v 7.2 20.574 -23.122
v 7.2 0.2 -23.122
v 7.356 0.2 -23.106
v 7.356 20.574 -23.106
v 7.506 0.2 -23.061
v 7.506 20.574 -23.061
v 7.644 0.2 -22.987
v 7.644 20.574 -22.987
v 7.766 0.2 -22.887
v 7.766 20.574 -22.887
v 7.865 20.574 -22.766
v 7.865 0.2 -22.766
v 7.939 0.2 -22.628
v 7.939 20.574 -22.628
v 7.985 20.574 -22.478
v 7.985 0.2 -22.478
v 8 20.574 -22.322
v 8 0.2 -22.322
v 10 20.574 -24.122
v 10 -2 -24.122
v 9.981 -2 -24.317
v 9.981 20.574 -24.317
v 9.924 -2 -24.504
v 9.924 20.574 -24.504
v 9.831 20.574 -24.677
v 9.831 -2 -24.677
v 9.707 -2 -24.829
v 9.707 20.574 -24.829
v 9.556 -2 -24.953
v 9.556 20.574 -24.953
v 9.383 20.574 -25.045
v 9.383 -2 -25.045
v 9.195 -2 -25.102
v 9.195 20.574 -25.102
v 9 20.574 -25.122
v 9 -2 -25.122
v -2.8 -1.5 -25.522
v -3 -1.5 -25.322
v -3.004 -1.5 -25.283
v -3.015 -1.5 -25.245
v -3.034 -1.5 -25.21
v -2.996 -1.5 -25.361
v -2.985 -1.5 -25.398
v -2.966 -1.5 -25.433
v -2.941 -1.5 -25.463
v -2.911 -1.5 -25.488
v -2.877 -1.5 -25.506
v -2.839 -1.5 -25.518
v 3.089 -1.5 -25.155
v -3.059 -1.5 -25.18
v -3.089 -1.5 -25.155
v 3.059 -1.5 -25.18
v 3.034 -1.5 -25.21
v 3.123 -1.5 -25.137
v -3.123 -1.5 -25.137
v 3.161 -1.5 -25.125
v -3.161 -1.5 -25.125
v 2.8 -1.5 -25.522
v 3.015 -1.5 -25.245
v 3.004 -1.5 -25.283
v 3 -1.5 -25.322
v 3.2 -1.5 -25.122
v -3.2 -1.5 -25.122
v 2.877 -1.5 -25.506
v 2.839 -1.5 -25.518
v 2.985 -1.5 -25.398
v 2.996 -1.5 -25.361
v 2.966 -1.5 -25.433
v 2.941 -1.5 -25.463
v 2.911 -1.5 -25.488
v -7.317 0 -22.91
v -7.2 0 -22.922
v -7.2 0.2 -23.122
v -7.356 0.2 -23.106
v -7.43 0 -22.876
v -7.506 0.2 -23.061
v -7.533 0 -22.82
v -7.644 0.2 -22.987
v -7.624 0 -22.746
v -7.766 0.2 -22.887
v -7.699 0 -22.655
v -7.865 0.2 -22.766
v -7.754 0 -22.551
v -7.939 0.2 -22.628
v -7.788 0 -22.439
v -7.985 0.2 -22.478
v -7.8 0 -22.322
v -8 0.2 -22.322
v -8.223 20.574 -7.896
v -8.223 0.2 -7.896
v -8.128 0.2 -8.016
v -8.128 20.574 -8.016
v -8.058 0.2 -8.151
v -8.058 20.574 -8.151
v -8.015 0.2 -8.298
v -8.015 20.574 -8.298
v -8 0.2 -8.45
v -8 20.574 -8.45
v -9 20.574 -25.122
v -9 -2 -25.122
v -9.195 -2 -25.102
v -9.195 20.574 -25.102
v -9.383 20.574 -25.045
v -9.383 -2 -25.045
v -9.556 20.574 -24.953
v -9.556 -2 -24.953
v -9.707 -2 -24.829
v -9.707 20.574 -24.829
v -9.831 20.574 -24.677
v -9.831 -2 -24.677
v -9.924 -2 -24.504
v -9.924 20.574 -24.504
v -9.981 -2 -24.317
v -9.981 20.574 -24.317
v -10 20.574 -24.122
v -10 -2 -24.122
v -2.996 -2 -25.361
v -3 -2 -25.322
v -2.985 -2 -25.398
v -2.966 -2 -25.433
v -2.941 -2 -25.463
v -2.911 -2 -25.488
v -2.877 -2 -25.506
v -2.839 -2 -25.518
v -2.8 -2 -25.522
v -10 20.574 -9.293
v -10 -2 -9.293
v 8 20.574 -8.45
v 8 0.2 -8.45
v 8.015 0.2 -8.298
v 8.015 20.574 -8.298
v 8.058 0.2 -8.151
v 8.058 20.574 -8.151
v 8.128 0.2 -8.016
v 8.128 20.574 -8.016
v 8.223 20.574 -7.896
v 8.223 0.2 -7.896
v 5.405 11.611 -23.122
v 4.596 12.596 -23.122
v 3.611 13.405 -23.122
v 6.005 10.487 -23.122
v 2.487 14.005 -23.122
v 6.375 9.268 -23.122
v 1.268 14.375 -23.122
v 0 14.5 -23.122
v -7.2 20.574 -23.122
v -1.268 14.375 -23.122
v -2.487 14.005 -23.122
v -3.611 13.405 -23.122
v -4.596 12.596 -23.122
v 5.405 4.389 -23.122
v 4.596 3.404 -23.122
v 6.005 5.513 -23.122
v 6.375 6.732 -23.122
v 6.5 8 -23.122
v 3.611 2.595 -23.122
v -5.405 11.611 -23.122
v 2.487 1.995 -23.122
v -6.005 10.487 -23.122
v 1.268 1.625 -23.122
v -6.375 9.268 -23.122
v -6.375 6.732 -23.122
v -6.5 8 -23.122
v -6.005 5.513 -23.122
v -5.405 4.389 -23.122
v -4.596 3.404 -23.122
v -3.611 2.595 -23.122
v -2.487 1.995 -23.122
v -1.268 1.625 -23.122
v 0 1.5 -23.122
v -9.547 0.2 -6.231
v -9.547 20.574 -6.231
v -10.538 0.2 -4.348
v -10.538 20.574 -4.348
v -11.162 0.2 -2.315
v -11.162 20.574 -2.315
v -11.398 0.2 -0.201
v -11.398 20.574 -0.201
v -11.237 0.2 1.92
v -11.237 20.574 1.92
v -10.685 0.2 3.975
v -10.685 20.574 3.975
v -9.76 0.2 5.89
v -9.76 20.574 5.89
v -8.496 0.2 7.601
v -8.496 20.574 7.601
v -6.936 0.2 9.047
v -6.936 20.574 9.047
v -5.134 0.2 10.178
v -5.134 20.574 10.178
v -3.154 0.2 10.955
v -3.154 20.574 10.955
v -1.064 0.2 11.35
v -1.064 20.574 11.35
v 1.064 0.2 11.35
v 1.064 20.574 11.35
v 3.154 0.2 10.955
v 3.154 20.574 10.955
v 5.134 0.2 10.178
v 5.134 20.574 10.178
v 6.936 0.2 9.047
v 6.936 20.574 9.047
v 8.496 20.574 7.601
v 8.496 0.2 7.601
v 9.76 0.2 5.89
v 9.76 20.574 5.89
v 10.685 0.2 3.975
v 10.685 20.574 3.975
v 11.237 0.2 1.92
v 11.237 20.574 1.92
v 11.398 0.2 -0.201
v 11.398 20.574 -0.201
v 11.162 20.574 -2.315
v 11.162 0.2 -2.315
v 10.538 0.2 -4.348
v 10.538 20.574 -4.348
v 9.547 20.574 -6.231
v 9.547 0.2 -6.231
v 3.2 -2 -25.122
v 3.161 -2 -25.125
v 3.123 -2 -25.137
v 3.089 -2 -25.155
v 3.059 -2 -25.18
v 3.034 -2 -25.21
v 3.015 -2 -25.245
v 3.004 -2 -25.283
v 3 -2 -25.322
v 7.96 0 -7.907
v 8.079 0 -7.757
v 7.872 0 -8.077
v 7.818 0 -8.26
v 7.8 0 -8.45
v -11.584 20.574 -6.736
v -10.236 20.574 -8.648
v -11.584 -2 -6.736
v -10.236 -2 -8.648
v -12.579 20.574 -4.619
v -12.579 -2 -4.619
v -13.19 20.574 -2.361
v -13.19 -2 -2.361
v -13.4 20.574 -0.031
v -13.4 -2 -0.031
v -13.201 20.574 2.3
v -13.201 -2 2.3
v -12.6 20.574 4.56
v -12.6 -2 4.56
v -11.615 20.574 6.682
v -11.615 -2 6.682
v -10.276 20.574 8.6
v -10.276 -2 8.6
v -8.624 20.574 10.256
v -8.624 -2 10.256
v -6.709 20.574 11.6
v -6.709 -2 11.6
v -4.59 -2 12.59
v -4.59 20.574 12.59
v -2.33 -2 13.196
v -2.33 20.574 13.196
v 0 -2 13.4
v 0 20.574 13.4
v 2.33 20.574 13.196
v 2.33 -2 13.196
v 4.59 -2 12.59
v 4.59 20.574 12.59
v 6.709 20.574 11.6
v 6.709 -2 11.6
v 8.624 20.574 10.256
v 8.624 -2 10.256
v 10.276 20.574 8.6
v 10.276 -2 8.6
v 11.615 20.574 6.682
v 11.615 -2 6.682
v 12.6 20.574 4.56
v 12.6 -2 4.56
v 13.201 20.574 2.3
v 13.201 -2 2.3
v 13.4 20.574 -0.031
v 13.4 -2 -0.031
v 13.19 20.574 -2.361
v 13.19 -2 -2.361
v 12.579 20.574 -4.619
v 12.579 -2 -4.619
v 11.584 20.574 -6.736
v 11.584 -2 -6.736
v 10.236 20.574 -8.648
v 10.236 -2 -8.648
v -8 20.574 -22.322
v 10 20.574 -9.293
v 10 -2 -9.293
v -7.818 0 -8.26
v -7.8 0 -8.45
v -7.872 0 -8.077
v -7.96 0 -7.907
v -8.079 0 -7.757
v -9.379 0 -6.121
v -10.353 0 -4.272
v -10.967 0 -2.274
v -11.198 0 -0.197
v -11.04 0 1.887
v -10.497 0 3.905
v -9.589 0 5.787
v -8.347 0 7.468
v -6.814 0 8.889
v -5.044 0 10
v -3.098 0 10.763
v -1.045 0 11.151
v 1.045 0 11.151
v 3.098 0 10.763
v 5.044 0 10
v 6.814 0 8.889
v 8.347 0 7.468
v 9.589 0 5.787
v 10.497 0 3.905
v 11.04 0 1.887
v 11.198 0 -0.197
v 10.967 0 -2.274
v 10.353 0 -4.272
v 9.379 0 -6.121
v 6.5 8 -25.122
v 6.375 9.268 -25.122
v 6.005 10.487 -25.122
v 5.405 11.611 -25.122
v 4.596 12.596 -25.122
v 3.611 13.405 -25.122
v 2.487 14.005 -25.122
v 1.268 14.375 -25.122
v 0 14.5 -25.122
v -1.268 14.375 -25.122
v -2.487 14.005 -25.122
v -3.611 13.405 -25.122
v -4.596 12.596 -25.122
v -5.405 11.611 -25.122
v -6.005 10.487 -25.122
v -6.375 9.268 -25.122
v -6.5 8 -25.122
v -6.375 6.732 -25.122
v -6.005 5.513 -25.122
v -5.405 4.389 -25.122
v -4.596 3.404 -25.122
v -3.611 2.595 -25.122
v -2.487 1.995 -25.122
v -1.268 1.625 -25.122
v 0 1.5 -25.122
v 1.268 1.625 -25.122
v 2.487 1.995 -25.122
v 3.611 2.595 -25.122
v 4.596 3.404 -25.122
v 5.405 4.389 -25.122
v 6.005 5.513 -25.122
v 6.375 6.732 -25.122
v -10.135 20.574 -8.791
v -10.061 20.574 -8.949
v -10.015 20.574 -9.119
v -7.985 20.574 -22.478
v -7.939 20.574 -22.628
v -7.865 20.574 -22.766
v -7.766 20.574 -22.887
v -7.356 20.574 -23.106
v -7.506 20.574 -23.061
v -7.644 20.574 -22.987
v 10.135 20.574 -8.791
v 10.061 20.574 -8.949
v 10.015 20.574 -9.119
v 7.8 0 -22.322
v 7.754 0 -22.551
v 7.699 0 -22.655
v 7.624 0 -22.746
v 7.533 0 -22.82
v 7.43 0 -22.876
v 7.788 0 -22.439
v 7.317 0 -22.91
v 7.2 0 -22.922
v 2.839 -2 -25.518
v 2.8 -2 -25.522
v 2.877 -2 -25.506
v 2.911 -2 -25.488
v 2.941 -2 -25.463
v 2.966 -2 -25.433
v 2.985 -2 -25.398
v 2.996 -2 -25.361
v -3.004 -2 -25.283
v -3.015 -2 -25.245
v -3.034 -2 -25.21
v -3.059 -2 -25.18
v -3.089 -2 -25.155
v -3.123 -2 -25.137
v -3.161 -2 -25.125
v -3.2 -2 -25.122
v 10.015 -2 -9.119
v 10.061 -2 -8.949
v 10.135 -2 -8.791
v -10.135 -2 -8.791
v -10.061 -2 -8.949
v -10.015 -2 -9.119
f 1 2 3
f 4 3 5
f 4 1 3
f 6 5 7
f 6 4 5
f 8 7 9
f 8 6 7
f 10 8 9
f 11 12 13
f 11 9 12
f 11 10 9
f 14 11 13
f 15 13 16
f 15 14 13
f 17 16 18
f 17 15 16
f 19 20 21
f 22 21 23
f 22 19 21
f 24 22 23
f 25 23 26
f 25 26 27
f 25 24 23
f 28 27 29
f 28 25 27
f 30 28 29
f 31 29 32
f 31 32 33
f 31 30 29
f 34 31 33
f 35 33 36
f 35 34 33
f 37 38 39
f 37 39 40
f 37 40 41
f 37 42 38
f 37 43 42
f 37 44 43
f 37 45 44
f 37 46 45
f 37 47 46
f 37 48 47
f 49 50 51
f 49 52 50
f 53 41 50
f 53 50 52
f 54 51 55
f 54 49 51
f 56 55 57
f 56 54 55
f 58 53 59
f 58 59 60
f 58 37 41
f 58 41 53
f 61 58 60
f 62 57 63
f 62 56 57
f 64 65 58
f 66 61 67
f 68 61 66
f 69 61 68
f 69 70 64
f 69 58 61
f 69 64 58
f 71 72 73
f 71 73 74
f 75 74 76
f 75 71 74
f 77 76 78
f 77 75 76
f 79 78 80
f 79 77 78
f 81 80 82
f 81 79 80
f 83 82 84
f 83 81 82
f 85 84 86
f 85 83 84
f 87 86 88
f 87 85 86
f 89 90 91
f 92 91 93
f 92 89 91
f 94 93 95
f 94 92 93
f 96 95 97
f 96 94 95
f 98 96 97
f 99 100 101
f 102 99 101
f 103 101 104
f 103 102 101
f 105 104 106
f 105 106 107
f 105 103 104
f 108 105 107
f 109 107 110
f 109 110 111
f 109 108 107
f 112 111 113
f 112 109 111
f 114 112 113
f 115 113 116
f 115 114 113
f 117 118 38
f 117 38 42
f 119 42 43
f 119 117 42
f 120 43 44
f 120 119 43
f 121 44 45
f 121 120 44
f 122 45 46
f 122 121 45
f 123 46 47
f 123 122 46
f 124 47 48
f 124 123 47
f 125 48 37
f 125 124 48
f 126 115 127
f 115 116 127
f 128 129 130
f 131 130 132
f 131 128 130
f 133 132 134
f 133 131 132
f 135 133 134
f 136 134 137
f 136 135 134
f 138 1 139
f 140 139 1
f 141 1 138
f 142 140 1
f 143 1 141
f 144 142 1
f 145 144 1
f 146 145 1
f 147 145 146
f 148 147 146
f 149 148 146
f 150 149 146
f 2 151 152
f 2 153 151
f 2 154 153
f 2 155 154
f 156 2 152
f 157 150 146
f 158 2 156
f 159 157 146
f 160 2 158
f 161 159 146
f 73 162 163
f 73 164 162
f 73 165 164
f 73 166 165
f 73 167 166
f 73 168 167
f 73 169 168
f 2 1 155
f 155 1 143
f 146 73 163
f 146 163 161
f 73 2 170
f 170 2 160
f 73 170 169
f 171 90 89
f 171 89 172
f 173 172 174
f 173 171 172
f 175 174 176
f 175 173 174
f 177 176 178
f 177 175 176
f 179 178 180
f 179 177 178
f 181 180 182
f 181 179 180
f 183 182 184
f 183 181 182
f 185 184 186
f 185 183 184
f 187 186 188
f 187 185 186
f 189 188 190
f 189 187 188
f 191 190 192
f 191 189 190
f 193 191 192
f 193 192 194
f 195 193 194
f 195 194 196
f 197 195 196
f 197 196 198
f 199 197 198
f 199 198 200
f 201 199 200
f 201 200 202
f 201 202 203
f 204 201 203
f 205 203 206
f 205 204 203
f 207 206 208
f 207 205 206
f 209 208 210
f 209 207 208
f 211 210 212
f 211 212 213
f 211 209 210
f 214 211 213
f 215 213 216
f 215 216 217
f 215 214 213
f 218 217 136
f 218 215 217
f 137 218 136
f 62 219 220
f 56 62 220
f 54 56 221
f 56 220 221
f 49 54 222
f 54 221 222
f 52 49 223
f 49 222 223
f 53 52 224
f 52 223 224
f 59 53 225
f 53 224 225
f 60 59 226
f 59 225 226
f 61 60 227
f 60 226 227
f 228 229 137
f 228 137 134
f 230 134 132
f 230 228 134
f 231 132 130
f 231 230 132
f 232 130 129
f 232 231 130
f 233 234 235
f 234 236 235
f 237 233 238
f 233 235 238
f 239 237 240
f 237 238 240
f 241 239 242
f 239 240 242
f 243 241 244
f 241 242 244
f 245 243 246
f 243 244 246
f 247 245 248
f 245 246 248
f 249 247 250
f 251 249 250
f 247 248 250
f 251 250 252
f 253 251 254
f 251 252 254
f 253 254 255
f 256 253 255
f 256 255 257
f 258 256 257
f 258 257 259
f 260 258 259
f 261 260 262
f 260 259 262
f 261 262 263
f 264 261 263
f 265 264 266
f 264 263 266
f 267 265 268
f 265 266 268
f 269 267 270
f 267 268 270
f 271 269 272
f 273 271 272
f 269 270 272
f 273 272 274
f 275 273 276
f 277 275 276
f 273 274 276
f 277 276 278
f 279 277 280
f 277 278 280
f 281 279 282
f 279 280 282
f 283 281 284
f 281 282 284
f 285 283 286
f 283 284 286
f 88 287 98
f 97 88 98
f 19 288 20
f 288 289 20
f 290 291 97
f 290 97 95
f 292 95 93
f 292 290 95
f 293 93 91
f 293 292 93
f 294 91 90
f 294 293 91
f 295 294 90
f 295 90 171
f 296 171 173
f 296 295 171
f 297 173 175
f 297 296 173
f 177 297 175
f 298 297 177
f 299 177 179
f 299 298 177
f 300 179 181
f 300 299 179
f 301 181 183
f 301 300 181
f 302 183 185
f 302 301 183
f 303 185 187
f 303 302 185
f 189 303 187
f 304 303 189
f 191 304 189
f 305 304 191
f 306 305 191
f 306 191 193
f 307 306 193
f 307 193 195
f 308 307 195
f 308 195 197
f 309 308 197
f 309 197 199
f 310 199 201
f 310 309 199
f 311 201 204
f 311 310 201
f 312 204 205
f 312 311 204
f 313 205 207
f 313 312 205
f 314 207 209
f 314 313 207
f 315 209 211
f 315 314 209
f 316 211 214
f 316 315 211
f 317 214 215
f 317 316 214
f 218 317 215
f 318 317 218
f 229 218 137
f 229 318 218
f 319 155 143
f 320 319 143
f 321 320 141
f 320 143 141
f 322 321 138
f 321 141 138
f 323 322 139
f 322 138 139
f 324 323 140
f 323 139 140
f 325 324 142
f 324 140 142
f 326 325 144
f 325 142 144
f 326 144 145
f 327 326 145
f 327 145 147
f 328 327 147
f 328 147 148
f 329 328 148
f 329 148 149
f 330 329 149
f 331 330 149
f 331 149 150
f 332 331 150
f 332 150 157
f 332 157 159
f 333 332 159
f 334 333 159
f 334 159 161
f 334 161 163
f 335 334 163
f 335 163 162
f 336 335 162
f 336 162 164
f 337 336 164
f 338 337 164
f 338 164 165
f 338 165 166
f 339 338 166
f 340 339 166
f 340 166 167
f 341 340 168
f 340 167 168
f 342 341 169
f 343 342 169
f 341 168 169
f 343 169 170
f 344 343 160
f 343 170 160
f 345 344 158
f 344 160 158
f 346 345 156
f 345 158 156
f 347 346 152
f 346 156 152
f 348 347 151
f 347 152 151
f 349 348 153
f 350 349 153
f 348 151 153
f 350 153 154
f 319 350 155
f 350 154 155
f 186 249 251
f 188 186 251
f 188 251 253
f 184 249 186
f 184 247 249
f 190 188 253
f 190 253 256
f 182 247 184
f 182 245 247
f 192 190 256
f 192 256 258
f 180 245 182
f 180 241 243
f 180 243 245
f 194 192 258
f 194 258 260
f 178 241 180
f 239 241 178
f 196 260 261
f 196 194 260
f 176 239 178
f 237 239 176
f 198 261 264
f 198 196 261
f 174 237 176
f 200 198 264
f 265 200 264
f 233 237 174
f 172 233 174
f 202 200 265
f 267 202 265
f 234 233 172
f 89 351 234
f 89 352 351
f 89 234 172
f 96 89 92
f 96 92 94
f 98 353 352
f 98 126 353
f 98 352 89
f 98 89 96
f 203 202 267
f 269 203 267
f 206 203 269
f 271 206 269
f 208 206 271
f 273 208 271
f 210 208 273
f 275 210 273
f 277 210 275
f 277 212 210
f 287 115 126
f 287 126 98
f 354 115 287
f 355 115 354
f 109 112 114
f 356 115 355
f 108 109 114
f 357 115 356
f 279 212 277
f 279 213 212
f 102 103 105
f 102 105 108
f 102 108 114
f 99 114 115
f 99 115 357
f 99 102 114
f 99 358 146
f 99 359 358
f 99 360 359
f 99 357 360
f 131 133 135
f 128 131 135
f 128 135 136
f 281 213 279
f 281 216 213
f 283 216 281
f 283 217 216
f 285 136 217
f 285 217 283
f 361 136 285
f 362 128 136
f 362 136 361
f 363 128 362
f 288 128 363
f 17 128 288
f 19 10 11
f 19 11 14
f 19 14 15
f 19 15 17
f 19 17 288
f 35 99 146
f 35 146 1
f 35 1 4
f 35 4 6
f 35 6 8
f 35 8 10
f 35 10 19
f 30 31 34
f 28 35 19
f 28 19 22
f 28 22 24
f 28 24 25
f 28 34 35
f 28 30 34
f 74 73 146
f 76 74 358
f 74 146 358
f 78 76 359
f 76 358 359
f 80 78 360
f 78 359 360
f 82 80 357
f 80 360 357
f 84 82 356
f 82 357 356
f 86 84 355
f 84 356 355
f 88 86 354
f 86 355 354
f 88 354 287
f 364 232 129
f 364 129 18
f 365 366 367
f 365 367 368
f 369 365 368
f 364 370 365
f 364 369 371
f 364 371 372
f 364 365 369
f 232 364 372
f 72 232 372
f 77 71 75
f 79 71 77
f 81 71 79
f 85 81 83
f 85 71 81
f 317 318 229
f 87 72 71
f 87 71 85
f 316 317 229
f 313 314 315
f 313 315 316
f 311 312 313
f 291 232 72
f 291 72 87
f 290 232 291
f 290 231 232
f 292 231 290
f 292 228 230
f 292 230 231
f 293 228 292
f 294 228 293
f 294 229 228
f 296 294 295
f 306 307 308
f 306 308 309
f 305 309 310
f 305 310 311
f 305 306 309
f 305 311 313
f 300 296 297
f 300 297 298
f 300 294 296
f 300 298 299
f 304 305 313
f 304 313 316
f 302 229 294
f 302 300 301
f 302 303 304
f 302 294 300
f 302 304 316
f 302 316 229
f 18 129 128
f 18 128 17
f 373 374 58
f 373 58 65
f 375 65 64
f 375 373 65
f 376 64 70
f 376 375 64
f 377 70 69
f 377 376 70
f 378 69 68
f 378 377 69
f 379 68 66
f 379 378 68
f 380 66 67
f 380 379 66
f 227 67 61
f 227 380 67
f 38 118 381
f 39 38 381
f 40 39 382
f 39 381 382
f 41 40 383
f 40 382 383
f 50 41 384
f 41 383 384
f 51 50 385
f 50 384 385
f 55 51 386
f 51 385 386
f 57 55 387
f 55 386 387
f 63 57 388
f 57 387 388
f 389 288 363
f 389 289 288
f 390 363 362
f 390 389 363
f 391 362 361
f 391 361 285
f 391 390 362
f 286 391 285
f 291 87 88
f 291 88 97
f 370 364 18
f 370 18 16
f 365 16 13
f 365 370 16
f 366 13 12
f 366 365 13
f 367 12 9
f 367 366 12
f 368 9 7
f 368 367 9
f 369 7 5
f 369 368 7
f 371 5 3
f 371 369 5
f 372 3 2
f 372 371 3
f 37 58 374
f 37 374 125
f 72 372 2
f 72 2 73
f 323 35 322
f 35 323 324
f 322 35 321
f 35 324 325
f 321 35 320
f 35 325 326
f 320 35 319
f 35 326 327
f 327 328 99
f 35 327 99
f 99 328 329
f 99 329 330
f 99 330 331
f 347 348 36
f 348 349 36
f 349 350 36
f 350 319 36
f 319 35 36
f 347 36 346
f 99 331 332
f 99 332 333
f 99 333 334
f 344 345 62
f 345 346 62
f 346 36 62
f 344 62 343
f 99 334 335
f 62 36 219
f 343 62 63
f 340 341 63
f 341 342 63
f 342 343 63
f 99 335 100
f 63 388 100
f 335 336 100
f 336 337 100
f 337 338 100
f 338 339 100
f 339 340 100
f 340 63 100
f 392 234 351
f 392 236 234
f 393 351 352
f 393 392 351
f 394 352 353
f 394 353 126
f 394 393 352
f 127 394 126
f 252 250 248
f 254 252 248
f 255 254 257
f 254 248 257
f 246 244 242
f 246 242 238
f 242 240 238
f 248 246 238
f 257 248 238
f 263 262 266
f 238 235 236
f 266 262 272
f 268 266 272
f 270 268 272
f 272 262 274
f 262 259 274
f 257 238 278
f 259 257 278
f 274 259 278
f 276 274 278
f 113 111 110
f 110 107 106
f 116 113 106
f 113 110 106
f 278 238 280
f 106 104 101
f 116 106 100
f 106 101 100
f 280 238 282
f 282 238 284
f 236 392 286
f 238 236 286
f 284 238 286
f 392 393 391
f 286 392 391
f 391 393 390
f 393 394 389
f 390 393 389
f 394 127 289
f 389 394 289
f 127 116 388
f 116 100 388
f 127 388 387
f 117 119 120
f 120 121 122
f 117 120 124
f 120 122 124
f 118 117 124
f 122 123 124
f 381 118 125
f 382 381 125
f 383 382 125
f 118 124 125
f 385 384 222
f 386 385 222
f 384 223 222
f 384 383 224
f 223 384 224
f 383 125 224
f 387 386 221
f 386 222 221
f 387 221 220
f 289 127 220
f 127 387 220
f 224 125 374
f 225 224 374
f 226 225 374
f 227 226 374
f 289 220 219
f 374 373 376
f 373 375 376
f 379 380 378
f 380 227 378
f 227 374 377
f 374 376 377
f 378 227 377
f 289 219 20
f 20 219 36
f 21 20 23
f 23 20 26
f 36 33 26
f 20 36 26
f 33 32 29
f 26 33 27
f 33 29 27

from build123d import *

# Parameters (mm, degrees)
BOSS_EXTRUDE1_DEPTH = 20.574
BOSS_EXTRUDE2_START = 2
BOSS_EXTRUDE2_DEPTH = 2
SKETCH3_R           = 6.5
CUT_EXTRUDE1_DEPTH  = 45.007669834
FILLET1_R           = 1
SKETCH4_W           = 6
SKETCH4_H           = 0.5
BOSS_EXTRUDE3_DEPTH = 0.4
FILLET2_START       = -3
FILLET2_DEPTH       = 2
FILLET2_START_2     = -2
FILLET2_2_DEPTH     = 0.5
FILLET3_R           = 0.8
CHAMFER1_SIZE       = 0.2


with BuildPart() as part:
    # Sketch1 → Boss-Extrude1 (new body)
    with BuildSketch(Plane(origin=(0, 0, 0), x_dir=(1, 0, 0), z_dir=(0, 1, 0))):
        with BuildLine():
            Line((10, 8.919641248), (10, 25.121576202))
            Line((10, 25.121576202), (-10, 25.121576202))
            Line((-10, 25.121576202), (-10, 8.919641248))
            ThreePointArc((-10, 8.919641248), (0, -13.4), (10, 8.919641248))
        make_face()
        with BuildLine():
            Line((-8, 23.121576202), (-8, 8.121576202))
            ThreePointArc((-8, 8.121576202), (0, -11.4), (8, 8.121576202))
            Line((8, 8.121576202), (8, 23.121576202))
            Line((8, 23.121576202), (-8, 23.121576202))
        make_face(mode=Mode.SUBTRACT)
    extrude(amount=BOSS_EXTRUDE1_DEPTH)

    # Sketch2 → Boss-Extrude2 (add)
    with BuildSketch(Plane.XZ.offset(BOSS_EXTRUDE2_START)):
        with BuildLine():
            Line((10, -8.919641248), (10, -25.121576202))
            Line((10, -25.121576202), (-10, -25.121576202))
            Line((-10, -25.121576202), (-10, -8.919641248))
            ThreePointArc((-10, -8.919641248), (0, 13.4), (10, -8.919641248))
        make_face()
    extrude(amount=-BOSS_EXTRUDE2_DEPTH)

    # Sketch3 → Cut-Extrude1 (cut, through all)
    with BuildSketch(Plane.XY.offset(-23.121576202)):
        with Locations((0, 8)):
            Circle(SKETCH3_R)
    extrude(amount=-CUT_EXTRUDE1_DEPTH, mode=Mode.SUBTRACT)

    # Fillet1
    fillet1_edges = [part.edges().sort_by_distance(p)[0] for p in [
        (-10, 9.287, -8.919641248),
        (-10, 9.287, -25.121576202),
        (10, 9.287, -25.121576202),
        (10, 9.287, -8.919641248),
    ]]
    fillet(fillet1_edges, radius=FILLET1_R)

    # Sketch4 → Boss-Extrude3 (add)
    with BuildSketch(Plane(origin=(0, 0, -25.121576202), x_dir=(-1, 0, 0), z_dir=(0, 0, -1))):
        with Locations((0, -1.75)):
            Rectangle(SKETCH4_W, SKETCH4_H)
    extrude(amount=BOSS_EXTRUDE3_DEPTH)

    # Fillet2: read off the stored shape, not the designer's step
    # Fillet2 outline → Fillet2 (cut)
    with BuildSketch(Plane(origin=(0, 0, 0), x_dir=(1, 0, 0), z_dir=(0, 1, 0)).offset(FILLET2_START)):
        with BuildLine():
            ThreePointArc((-3, 25.321576202), (-2.941421356, 25.462997558), (-2.8, 25.521576202))
            Line((-2.8, 25.521576202), (-3, 25.521576202))
            Line((-3, 25.521576202), (-3, 25.321576202))
        make_face()
        with BuildLine():
            Line((3, 25.521576202), (2.8, 25.521576202))
            ThreePointArc((2.8, 25.521576202), (2.941421356, 25.462997558), (3, 25.321576202))
            Line((3, 25.321576202), (3, 25.521576202))
        make_face()
    extrude(amount=FILLET2_DEPTH, mode=Mode.SUBTRACT)

    # Fillet2 2 outline → Fillet2 2 (add)
    with BuildSketch(Plane(origin=(0, 0, 0), x_dir=(1, 0, 0), z_dir=(0, 1, 0)).offset(FILLET2_START_2)):
        with BuildLine():
            Line((-3, 25.121576202), (-3, 25.321576202))
            ThreePointArc((-3, 25.321576202), (-3.058578644, 25.180154845), (-3.2, 25.121576202))
            Line((-3.2, 25.121576202), (-3, 25.121576202))
        make_face()
        with BuildLine():
            ThreePointArc((3.2, 25.121576202), (3.058578644, 25.180154845), (3, 25.321576202))
            Line((3, 25.321576202), (3, 25.121576202))
            Line((3, 25.121576202), (3.2, 25.121576202))
        make_face()
    extrude(amount=FILLET2_2_DEPTH)

    # Fillet3
    fillet3_edges = [part.edges().sort_by_distance(p)[0] for p in [
        (8, 10.287, -23.121576202),
        (-8, 10.287, -23.121576202),
        (-8, 10.287, -8.121576202),
        (8, 10.287, -8.121576202),
    ]]
    fillet(fillet3_edges, radius=FILLET3_R)

    # Chamfer1
    chamfer1_edges = [part.edges().sort_by_distance(p)[0] for p in [
        (8, 0, -15.385714136),
        (0, 0, -23.121576202),
        (-8, 0, -15.385714136),
        (0, 0, 11.4),
        (-7.765685425, 0, -22.887261627),
        (7.765685425, 0, -22.887261627),
        (8.057827734, 0, -8.151221315),
        (-8.057827734, 0, -8.151221315),
    ]]
    chamfer(chamfer1_edges, length=CHAMFER1_SIZE)


solid = part.part
